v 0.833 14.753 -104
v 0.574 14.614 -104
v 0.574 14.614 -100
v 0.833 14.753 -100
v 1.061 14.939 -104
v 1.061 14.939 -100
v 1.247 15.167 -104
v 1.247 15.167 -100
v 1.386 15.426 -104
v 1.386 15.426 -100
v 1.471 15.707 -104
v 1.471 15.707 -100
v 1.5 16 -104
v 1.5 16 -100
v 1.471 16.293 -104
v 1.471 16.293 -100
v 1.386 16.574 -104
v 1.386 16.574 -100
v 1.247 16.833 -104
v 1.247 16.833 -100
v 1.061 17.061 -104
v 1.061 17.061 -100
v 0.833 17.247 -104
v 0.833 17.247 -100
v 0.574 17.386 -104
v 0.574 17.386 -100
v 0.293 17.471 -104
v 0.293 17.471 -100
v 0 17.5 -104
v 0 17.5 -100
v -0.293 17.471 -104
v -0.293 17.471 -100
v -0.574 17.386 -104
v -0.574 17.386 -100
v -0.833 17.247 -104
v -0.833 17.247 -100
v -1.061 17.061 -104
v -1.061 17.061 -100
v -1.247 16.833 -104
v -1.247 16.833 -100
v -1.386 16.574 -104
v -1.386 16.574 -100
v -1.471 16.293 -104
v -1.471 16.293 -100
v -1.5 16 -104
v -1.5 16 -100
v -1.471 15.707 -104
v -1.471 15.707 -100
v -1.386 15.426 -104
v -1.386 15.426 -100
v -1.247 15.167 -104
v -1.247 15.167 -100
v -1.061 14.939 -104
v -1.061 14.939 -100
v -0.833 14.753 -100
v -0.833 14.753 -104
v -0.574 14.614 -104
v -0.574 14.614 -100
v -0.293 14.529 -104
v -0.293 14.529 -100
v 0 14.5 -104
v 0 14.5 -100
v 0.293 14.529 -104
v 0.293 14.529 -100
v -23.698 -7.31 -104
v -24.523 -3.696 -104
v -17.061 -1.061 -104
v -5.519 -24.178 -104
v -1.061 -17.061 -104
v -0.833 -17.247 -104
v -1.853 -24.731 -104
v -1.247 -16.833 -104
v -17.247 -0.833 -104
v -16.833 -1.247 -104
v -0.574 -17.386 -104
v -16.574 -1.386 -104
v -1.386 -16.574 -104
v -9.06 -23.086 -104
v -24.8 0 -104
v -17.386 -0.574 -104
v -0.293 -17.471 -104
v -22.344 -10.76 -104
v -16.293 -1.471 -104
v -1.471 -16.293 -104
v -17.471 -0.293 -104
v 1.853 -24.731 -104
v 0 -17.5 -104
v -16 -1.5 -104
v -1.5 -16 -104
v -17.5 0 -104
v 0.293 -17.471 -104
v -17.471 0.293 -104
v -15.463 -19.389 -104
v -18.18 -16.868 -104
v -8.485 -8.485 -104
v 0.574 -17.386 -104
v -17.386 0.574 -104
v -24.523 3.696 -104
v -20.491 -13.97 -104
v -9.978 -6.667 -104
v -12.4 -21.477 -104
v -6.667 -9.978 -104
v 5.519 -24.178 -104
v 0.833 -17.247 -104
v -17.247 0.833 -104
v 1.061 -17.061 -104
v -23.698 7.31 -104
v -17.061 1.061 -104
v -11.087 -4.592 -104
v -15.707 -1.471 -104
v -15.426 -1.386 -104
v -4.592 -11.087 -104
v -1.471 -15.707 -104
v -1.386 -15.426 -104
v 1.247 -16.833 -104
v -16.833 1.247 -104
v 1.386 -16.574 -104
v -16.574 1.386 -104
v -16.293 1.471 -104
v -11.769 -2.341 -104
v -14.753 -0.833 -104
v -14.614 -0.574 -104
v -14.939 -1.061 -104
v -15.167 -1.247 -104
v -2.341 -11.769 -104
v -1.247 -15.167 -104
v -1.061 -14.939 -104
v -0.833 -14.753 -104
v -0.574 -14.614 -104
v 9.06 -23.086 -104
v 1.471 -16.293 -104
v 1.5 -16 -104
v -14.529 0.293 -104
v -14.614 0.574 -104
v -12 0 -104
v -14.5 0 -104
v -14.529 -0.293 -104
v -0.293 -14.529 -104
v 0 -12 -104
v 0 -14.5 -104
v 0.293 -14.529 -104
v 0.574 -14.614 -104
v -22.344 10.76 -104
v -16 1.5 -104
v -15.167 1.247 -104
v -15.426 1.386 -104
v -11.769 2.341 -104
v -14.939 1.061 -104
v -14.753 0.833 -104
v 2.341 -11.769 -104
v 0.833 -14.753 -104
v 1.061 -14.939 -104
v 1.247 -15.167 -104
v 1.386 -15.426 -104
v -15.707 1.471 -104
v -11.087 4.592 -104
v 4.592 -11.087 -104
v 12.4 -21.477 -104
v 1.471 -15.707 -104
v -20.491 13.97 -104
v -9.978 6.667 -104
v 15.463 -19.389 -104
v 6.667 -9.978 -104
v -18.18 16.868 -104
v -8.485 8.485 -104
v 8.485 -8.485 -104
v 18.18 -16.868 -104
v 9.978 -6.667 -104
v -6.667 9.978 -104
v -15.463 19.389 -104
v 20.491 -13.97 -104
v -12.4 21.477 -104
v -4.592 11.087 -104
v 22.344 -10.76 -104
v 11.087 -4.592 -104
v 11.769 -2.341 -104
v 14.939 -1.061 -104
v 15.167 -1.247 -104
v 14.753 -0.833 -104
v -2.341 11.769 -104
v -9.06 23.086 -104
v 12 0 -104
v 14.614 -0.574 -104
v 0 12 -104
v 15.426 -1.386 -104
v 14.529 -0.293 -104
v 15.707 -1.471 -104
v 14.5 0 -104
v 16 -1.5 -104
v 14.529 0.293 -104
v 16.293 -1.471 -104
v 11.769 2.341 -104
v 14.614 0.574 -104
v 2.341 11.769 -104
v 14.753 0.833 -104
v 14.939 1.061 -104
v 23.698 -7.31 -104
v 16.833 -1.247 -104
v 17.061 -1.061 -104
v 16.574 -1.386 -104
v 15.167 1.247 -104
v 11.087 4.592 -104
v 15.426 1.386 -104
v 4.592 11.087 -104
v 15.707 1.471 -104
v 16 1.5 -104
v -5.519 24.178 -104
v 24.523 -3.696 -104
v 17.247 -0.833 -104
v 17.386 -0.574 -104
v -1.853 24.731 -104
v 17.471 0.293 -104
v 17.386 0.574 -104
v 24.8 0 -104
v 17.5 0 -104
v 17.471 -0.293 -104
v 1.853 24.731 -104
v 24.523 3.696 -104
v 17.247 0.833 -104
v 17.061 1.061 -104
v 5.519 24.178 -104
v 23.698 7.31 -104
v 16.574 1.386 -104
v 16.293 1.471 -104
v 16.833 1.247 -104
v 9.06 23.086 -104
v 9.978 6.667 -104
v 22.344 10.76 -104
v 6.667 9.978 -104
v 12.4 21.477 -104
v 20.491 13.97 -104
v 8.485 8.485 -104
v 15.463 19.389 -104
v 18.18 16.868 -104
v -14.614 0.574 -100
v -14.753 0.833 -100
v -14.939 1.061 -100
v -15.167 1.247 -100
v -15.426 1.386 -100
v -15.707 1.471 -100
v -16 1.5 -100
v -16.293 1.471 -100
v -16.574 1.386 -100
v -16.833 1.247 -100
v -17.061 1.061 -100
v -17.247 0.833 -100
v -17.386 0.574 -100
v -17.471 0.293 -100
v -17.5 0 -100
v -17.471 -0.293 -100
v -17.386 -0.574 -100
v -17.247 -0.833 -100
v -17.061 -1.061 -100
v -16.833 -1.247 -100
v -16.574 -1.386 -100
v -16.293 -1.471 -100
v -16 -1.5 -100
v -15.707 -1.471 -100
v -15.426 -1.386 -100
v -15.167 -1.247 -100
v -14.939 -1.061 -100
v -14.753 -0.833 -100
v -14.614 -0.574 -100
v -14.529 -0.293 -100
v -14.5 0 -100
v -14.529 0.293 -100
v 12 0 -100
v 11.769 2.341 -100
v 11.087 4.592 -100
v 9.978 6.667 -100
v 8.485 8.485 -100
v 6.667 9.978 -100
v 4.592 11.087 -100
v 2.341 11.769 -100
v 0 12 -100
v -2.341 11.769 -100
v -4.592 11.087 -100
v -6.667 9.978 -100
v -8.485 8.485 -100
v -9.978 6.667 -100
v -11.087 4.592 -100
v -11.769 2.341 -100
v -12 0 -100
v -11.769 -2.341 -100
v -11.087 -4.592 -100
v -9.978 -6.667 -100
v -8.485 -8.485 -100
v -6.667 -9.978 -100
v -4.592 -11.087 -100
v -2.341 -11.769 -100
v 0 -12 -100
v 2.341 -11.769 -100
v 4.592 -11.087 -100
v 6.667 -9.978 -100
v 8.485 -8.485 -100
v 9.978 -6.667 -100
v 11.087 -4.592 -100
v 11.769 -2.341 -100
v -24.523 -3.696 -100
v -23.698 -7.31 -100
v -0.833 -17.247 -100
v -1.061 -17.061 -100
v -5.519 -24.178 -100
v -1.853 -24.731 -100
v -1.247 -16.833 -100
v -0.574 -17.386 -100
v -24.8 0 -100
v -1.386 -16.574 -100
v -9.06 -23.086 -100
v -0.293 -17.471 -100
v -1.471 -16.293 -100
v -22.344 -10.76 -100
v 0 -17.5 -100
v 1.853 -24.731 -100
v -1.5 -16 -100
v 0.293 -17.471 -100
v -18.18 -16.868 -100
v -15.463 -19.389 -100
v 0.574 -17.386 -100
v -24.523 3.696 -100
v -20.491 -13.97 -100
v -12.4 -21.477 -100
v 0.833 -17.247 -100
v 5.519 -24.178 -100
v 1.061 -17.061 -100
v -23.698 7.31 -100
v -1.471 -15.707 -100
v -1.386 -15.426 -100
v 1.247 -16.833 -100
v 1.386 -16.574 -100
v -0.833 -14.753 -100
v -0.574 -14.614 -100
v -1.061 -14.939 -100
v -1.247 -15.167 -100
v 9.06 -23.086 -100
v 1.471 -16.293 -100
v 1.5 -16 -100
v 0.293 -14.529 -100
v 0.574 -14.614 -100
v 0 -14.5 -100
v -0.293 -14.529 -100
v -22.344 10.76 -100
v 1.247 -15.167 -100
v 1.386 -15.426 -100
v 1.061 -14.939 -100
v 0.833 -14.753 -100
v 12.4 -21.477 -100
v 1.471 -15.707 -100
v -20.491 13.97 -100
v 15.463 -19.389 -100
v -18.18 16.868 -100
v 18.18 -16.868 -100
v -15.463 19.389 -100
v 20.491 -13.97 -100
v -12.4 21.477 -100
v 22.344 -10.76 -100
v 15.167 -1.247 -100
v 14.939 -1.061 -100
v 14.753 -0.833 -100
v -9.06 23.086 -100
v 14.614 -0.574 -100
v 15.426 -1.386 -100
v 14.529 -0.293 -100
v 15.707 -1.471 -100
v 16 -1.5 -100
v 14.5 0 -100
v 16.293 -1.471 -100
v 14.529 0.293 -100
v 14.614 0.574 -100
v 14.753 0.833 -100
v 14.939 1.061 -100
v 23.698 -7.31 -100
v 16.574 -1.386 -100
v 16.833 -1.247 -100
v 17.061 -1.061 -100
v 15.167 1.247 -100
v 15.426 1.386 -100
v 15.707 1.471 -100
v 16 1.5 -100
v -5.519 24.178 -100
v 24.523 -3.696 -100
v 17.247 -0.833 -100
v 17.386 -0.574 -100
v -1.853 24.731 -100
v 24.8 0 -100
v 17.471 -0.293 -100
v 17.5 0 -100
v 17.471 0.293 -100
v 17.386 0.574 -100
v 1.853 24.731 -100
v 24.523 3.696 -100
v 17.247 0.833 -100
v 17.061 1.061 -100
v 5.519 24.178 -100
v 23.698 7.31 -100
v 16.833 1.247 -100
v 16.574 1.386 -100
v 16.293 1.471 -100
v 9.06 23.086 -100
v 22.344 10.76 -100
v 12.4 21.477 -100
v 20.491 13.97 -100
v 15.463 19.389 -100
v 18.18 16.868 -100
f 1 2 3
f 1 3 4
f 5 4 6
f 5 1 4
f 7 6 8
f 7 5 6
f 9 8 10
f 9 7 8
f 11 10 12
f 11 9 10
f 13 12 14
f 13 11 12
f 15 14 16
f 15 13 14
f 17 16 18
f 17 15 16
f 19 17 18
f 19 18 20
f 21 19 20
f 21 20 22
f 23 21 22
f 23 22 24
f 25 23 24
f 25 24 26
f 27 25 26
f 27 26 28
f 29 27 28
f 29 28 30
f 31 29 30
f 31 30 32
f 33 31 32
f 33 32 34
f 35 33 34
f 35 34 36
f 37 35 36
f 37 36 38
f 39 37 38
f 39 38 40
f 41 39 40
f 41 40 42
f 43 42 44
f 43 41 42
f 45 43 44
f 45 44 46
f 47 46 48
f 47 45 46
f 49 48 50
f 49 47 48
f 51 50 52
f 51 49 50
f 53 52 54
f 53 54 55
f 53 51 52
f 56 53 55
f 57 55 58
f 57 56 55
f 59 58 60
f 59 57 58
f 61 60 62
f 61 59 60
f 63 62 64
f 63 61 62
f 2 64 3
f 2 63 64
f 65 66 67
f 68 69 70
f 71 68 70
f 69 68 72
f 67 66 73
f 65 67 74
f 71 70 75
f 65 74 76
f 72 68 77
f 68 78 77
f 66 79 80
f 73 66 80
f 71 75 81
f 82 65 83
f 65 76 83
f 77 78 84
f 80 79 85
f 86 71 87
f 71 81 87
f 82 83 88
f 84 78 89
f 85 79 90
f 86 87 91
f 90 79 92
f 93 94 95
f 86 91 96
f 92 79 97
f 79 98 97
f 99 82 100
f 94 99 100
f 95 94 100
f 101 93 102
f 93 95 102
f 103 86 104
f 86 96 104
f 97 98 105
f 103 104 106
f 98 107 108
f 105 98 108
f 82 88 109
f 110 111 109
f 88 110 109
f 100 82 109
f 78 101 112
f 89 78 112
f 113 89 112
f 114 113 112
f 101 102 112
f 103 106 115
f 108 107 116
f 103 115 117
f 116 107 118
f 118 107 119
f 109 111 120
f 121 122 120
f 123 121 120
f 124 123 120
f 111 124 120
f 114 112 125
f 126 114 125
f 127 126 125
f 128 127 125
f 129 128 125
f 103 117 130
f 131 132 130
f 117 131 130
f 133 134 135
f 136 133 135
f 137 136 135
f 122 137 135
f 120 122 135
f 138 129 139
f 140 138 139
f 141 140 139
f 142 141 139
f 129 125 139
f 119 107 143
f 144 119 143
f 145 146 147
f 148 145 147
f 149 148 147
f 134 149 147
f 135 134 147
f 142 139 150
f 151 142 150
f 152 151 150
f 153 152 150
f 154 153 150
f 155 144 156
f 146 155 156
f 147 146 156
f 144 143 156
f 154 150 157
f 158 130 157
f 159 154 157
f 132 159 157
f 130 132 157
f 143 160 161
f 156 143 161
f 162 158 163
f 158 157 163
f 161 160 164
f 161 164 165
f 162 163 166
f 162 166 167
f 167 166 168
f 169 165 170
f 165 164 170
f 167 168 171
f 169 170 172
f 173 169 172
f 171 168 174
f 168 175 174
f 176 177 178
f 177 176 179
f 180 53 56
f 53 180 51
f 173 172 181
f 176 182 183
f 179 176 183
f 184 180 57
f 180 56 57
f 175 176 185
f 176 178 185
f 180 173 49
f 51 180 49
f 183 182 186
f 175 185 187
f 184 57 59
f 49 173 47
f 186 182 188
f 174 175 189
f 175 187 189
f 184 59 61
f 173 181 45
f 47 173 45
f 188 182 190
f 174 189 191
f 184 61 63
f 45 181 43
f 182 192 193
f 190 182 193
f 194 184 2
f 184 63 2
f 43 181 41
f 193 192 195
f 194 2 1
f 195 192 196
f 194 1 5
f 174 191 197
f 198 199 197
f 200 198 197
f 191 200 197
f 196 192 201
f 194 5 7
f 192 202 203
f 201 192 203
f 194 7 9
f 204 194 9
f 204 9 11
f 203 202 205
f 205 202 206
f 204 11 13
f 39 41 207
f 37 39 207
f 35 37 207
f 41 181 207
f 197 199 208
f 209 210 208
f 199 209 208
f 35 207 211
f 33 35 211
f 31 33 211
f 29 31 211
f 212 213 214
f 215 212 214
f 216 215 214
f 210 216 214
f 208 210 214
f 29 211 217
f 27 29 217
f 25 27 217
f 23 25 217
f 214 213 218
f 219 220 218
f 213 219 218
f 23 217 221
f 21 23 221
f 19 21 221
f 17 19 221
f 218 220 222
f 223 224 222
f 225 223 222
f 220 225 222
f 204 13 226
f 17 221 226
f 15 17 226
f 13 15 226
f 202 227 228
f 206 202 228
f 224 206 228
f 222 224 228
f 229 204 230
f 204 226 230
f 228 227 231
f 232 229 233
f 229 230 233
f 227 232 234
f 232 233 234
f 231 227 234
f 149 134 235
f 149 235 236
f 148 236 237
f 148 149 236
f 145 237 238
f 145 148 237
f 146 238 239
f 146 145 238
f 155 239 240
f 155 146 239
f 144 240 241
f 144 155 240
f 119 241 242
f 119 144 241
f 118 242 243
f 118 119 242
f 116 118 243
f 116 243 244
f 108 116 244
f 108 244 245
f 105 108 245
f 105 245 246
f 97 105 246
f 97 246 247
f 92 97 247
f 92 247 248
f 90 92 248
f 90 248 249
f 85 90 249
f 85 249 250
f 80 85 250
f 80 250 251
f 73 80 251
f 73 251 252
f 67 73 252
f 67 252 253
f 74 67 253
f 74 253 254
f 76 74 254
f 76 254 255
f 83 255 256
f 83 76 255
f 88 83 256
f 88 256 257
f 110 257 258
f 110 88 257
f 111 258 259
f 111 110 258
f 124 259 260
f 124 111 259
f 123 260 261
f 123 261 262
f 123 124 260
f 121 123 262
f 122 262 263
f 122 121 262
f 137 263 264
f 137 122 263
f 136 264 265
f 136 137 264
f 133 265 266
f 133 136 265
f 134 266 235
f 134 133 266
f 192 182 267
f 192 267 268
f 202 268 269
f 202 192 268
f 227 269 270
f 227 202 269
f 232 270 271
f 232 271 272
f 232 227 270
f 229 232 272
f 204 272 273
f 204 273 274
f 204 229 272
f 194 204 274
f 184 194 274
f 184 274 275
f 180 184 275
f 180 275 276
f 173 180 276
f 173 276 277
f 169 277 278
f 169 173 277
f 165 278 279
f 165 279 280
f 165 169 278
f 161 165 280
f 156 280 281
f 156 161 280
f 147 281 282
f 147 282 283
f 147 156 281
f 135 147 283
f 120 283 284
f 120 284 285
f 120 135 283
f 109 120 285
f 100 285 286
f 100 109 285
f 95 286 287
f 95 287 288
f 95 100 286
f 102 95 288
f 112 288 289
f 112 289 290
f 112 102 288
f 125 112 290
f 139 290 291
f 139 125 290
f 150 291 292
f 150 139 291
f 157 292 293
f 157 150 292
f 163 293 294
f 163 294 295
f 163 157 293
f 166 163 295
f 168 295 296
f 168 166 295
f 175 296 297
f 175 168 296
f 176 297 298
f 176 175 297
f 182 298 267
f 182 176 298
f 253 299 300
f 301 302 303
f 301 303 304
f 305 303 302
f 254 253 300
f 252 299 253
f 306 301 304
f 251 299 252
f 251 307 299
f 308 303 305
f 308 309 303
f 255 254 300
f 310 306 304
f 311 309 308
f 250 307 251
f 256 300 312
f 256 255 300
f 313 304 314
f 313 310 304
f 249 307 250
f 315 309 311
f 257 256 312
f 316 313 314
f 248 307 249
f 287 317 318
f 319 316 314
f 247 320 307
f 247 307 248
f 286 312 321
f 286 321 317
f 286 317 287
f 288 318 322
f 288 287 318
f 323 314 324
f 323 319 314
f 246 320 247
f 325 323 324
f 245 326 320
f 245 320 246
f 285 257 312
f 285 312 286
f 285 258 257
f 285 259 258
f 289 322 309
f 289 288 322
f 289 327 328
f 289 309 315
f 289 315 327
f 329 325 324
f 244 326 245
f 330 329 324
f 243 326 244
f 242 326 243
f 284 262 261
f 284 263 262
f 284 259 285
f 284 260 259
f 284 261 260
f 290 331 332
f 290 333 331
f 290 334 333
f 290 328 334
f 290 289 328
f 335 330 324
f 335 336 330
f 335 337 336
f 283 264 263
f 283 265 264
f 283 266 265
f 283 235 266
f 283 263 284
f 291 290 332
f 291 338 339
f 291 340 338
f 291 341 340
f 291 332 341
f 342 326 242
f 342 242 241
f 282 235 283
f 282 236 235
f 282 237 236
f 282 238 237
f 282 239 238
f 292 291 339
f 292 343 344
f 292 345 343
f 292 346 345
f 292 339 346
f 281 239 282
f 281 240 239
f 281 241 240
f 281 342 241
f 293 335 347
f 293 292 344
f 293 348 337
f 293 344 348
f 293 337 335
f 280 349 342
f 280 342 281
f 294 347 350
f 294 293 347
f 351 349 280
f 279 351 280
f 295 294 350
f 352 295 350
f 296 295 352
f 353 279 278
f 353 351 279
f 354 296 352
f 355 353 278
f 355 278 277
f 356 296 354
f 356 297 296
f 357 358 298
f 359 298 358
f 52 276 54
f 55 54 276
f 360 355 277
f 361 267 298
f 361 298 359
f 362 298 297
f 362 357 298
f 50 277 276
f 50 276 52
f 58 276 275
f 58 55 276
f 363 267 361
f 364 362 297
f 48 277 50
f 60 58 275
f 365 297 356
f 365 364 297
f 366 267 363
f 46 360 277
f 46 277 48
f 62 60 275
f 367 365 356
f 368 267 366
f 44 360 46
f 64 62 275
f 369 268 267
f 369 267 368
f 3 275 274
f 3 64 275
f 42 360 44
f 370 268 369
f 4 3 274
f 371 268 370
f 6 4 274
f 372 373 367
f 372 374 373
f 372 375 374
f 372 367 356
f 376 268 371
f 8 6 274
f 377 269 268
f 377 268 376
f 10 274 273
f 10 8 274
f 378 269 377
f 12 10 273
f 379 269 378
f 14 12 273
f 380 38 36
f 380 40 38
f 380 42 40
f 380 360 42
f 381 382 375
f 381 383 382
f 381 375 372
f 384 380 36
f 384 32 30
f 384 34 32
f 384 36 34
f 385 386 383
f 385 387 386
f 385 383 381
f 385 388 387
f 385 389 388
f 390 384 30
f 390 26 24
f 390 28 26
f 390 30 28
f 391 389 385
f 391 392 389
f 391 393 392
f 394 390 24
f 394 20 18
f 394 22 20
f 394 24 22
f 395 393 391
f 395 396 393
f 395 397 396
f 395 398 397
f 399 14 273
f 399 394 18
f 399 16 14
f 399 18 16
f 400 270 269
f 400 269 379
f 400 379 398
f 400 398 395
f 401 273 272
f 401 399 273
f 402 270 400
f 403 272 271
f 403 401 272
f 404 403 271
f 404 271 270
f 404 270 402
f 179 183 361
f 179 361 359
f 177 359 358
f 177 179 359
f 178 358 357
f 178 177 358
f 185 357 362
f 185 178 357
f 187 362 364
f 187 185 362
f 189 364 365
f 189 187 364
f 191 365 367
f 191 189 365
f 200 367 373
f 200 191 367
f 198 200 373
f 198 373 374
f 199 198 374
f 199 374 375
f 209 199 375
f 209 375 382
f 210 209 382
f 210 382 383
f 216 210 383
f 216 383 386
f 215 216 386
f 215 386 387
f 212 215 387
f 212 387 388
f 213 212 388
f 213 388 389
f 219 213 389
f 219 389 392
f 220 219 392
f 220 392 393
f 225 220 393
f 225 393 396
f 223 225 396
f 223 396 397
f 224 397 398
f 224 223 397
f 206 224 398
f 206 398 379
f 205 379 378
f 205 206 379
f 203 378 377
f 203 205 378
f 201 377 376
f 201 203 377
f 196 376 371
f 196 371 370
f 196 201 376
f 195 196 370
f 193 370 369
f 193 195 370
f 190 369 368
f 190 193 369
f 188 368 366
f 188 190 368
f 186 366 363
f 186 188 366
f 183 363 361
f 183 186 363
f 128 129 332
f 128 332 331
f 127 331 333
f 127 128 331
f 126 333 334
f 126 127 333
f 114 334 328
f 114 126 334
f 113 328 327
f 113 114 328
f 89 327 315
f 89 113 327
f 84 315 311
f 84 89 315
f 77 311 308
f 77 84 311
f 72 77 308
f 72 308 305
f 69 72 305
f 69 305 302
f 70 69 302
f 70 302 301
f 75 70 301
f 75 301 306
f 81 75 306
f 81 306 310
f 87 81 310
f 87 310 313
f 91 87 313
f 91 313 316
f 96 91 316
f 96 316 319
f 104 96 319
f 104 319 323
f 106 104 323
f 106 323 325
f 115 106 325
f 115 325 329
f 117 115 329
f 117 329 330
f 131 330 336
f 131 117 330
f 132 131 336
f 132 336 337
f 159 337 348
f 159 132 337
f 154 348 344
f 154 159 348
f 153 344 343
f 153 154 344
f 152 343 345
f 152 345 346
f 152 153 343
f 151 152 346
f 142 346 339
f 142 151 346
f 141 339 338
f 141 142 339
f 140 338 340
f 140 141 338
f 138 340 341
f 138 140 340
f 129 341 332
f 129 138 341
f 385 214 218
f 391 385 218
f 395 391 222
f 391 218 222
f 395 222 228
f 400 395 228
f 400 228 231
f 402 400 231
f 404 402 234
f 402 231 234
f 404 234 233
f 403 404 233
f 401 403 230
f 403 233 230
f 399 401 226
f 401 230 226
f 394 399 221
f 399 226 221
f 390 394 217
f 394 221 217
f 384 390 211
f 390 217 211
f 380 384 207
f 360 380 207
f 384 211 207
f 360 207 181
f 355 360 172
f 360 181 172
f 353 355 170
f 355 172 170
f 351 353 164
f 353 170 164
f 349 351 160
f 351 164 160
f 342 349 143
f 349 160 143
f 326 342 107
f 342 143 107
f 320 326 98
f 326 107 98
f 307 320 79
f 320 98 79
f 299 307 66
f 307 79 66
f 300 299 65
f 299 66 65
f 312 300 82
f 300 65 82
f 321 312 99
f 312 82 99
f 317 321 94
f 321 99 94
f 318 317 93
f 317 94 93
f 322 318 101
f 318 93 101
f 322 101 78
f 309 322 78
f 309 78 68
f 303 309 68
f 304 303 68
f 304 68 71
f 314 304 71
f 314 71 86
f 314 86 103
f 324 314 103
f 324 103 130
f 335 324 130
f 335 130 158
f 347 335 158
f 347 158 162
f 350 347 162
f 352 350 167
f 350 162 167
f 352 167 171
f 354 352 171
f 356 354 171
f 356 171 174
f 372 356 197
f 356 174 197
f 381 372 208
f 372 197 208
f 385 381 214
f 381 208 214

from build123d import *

# Parameters (mm, degrees)
CYLINDER275_R               = 1.5
CYLINDER275_DEPTH           = 16
CYLINDER275_PLACEMENT_ANGLE = 67.5
CYLINDER273_R               = 1.5
CYLINDER273_DEPTH           = 16
CYLINDER273_PLACEMENT_ANGLE = 22.5
CYLINDER274_R               = 1.5
CYLINDER274_DEPTH           = 16
CYLINDER274_PLACEMENT_ANGLE = 112.5
CYLINDER272_R               = 1.5
CYLINDER272_DEPTH           = 16
CYLINDER272_PLACEMENT_ANGLE = 202.5
TUBE030_R                   = 24.8
TUBE030_R_2                 = 12
TUBE030_DEPTH               = 4


with BuildPart() as v_lec275:
    # Cylinder275 → Cylinder275 (new body)
    with BuildSketch(Plane.XY):
        Circle(CYLINDER275_R)
    extrude(amount=CYLINDER275_DEPTH)


with BuildPart() as v_lec275_1:
    # Cylinder275 placement: moved
    add(v_lec275.part.moved(Location((0, 16, 2))).rotate(Axis((0, 16, 2), (0, 0, -1)), CYLINDER275_PLACEMENT_ANGLE))


with BuildPart() as v_lec273:
    # Cylinder273 → Cylinder273 (new body)
    with BuildSketch(Plane.XY):
        Circle(CYLINDER273_R)
    extrude(amount=CYLINDER273_DEPTH)


with BuildPart() as v_lec273_1:
    # Cylinder273 placement: moved
    add(v_lec273.part.moved(Location((-16, 0, 2))).rotate(Axis((-16, 0, 2), (0, 0, 1)), CYLINDER273_PLACEMENT_ANGLE))


with BuildPart() as v_lec274:
    # Cylinder274 → Cylinder274 (new body)
    with BuildSketch(Plane.XY):
        Circle(CYLINDER274_R)
    extrude(amount=CYLINDER274_DEPTH)


with BuildPart() as v_lec274_1:
    # Cylinder274 placement: moved
    add(v_lec274.part.moved(Location((0, -16, 2))).rotate(Axis((0, -16, 2), (0, 0, 1)), CYLINDER274_PLACEMENT_ANGLE))


with BuildPart() as compound233:
    # Cylinder272 → Cylinder272 (new body)
    with BuildSketch(Plane.XY):
        Circle(CYLINDER272_R)
    extrude(amount=CYLINDER272_DEPTH)


with BuildPart() as compound233_1:
    # Cylinder272 placement: moved
    add(compound233.part.moved(Location((16, 0, 2))).rotate(Axis((16, 0, 2), (0, 0, 1)), CYLINDER272_PLACEMENT_ANGLE))

    # Compound233: union Válec275, Válec273, Válec274
    add(v_lec275_1.part)
    add(v_lec273_1.part)
    add(v_lec274_1.part)


with BuildPart() as compound233_2:
    # Compound233 placement: moved
    add(compound233_1.part.moved(Location((0, 0, -117))))


with BuildPart() as cut124:
    # Tube030 → Tube030 (new body)
    with BuildSketch(Plane.XY.offset(-103)):
        Circle(TUBE030_R)
        Circle(TUBE030_R_2, mode=Mode.SUBTRACT)
    extrude(amount=TUBE030_DEPTH)

    # Cut124: cut Compound233
    add(compound233_2.part, mode=Mode.SUBTRACT)


with BuildPart() as cut124_1:
    # Cut124 placement: moved
    add(cut124.part.moved(Location((0, 0, -1))))


solid = cut124_1.part
